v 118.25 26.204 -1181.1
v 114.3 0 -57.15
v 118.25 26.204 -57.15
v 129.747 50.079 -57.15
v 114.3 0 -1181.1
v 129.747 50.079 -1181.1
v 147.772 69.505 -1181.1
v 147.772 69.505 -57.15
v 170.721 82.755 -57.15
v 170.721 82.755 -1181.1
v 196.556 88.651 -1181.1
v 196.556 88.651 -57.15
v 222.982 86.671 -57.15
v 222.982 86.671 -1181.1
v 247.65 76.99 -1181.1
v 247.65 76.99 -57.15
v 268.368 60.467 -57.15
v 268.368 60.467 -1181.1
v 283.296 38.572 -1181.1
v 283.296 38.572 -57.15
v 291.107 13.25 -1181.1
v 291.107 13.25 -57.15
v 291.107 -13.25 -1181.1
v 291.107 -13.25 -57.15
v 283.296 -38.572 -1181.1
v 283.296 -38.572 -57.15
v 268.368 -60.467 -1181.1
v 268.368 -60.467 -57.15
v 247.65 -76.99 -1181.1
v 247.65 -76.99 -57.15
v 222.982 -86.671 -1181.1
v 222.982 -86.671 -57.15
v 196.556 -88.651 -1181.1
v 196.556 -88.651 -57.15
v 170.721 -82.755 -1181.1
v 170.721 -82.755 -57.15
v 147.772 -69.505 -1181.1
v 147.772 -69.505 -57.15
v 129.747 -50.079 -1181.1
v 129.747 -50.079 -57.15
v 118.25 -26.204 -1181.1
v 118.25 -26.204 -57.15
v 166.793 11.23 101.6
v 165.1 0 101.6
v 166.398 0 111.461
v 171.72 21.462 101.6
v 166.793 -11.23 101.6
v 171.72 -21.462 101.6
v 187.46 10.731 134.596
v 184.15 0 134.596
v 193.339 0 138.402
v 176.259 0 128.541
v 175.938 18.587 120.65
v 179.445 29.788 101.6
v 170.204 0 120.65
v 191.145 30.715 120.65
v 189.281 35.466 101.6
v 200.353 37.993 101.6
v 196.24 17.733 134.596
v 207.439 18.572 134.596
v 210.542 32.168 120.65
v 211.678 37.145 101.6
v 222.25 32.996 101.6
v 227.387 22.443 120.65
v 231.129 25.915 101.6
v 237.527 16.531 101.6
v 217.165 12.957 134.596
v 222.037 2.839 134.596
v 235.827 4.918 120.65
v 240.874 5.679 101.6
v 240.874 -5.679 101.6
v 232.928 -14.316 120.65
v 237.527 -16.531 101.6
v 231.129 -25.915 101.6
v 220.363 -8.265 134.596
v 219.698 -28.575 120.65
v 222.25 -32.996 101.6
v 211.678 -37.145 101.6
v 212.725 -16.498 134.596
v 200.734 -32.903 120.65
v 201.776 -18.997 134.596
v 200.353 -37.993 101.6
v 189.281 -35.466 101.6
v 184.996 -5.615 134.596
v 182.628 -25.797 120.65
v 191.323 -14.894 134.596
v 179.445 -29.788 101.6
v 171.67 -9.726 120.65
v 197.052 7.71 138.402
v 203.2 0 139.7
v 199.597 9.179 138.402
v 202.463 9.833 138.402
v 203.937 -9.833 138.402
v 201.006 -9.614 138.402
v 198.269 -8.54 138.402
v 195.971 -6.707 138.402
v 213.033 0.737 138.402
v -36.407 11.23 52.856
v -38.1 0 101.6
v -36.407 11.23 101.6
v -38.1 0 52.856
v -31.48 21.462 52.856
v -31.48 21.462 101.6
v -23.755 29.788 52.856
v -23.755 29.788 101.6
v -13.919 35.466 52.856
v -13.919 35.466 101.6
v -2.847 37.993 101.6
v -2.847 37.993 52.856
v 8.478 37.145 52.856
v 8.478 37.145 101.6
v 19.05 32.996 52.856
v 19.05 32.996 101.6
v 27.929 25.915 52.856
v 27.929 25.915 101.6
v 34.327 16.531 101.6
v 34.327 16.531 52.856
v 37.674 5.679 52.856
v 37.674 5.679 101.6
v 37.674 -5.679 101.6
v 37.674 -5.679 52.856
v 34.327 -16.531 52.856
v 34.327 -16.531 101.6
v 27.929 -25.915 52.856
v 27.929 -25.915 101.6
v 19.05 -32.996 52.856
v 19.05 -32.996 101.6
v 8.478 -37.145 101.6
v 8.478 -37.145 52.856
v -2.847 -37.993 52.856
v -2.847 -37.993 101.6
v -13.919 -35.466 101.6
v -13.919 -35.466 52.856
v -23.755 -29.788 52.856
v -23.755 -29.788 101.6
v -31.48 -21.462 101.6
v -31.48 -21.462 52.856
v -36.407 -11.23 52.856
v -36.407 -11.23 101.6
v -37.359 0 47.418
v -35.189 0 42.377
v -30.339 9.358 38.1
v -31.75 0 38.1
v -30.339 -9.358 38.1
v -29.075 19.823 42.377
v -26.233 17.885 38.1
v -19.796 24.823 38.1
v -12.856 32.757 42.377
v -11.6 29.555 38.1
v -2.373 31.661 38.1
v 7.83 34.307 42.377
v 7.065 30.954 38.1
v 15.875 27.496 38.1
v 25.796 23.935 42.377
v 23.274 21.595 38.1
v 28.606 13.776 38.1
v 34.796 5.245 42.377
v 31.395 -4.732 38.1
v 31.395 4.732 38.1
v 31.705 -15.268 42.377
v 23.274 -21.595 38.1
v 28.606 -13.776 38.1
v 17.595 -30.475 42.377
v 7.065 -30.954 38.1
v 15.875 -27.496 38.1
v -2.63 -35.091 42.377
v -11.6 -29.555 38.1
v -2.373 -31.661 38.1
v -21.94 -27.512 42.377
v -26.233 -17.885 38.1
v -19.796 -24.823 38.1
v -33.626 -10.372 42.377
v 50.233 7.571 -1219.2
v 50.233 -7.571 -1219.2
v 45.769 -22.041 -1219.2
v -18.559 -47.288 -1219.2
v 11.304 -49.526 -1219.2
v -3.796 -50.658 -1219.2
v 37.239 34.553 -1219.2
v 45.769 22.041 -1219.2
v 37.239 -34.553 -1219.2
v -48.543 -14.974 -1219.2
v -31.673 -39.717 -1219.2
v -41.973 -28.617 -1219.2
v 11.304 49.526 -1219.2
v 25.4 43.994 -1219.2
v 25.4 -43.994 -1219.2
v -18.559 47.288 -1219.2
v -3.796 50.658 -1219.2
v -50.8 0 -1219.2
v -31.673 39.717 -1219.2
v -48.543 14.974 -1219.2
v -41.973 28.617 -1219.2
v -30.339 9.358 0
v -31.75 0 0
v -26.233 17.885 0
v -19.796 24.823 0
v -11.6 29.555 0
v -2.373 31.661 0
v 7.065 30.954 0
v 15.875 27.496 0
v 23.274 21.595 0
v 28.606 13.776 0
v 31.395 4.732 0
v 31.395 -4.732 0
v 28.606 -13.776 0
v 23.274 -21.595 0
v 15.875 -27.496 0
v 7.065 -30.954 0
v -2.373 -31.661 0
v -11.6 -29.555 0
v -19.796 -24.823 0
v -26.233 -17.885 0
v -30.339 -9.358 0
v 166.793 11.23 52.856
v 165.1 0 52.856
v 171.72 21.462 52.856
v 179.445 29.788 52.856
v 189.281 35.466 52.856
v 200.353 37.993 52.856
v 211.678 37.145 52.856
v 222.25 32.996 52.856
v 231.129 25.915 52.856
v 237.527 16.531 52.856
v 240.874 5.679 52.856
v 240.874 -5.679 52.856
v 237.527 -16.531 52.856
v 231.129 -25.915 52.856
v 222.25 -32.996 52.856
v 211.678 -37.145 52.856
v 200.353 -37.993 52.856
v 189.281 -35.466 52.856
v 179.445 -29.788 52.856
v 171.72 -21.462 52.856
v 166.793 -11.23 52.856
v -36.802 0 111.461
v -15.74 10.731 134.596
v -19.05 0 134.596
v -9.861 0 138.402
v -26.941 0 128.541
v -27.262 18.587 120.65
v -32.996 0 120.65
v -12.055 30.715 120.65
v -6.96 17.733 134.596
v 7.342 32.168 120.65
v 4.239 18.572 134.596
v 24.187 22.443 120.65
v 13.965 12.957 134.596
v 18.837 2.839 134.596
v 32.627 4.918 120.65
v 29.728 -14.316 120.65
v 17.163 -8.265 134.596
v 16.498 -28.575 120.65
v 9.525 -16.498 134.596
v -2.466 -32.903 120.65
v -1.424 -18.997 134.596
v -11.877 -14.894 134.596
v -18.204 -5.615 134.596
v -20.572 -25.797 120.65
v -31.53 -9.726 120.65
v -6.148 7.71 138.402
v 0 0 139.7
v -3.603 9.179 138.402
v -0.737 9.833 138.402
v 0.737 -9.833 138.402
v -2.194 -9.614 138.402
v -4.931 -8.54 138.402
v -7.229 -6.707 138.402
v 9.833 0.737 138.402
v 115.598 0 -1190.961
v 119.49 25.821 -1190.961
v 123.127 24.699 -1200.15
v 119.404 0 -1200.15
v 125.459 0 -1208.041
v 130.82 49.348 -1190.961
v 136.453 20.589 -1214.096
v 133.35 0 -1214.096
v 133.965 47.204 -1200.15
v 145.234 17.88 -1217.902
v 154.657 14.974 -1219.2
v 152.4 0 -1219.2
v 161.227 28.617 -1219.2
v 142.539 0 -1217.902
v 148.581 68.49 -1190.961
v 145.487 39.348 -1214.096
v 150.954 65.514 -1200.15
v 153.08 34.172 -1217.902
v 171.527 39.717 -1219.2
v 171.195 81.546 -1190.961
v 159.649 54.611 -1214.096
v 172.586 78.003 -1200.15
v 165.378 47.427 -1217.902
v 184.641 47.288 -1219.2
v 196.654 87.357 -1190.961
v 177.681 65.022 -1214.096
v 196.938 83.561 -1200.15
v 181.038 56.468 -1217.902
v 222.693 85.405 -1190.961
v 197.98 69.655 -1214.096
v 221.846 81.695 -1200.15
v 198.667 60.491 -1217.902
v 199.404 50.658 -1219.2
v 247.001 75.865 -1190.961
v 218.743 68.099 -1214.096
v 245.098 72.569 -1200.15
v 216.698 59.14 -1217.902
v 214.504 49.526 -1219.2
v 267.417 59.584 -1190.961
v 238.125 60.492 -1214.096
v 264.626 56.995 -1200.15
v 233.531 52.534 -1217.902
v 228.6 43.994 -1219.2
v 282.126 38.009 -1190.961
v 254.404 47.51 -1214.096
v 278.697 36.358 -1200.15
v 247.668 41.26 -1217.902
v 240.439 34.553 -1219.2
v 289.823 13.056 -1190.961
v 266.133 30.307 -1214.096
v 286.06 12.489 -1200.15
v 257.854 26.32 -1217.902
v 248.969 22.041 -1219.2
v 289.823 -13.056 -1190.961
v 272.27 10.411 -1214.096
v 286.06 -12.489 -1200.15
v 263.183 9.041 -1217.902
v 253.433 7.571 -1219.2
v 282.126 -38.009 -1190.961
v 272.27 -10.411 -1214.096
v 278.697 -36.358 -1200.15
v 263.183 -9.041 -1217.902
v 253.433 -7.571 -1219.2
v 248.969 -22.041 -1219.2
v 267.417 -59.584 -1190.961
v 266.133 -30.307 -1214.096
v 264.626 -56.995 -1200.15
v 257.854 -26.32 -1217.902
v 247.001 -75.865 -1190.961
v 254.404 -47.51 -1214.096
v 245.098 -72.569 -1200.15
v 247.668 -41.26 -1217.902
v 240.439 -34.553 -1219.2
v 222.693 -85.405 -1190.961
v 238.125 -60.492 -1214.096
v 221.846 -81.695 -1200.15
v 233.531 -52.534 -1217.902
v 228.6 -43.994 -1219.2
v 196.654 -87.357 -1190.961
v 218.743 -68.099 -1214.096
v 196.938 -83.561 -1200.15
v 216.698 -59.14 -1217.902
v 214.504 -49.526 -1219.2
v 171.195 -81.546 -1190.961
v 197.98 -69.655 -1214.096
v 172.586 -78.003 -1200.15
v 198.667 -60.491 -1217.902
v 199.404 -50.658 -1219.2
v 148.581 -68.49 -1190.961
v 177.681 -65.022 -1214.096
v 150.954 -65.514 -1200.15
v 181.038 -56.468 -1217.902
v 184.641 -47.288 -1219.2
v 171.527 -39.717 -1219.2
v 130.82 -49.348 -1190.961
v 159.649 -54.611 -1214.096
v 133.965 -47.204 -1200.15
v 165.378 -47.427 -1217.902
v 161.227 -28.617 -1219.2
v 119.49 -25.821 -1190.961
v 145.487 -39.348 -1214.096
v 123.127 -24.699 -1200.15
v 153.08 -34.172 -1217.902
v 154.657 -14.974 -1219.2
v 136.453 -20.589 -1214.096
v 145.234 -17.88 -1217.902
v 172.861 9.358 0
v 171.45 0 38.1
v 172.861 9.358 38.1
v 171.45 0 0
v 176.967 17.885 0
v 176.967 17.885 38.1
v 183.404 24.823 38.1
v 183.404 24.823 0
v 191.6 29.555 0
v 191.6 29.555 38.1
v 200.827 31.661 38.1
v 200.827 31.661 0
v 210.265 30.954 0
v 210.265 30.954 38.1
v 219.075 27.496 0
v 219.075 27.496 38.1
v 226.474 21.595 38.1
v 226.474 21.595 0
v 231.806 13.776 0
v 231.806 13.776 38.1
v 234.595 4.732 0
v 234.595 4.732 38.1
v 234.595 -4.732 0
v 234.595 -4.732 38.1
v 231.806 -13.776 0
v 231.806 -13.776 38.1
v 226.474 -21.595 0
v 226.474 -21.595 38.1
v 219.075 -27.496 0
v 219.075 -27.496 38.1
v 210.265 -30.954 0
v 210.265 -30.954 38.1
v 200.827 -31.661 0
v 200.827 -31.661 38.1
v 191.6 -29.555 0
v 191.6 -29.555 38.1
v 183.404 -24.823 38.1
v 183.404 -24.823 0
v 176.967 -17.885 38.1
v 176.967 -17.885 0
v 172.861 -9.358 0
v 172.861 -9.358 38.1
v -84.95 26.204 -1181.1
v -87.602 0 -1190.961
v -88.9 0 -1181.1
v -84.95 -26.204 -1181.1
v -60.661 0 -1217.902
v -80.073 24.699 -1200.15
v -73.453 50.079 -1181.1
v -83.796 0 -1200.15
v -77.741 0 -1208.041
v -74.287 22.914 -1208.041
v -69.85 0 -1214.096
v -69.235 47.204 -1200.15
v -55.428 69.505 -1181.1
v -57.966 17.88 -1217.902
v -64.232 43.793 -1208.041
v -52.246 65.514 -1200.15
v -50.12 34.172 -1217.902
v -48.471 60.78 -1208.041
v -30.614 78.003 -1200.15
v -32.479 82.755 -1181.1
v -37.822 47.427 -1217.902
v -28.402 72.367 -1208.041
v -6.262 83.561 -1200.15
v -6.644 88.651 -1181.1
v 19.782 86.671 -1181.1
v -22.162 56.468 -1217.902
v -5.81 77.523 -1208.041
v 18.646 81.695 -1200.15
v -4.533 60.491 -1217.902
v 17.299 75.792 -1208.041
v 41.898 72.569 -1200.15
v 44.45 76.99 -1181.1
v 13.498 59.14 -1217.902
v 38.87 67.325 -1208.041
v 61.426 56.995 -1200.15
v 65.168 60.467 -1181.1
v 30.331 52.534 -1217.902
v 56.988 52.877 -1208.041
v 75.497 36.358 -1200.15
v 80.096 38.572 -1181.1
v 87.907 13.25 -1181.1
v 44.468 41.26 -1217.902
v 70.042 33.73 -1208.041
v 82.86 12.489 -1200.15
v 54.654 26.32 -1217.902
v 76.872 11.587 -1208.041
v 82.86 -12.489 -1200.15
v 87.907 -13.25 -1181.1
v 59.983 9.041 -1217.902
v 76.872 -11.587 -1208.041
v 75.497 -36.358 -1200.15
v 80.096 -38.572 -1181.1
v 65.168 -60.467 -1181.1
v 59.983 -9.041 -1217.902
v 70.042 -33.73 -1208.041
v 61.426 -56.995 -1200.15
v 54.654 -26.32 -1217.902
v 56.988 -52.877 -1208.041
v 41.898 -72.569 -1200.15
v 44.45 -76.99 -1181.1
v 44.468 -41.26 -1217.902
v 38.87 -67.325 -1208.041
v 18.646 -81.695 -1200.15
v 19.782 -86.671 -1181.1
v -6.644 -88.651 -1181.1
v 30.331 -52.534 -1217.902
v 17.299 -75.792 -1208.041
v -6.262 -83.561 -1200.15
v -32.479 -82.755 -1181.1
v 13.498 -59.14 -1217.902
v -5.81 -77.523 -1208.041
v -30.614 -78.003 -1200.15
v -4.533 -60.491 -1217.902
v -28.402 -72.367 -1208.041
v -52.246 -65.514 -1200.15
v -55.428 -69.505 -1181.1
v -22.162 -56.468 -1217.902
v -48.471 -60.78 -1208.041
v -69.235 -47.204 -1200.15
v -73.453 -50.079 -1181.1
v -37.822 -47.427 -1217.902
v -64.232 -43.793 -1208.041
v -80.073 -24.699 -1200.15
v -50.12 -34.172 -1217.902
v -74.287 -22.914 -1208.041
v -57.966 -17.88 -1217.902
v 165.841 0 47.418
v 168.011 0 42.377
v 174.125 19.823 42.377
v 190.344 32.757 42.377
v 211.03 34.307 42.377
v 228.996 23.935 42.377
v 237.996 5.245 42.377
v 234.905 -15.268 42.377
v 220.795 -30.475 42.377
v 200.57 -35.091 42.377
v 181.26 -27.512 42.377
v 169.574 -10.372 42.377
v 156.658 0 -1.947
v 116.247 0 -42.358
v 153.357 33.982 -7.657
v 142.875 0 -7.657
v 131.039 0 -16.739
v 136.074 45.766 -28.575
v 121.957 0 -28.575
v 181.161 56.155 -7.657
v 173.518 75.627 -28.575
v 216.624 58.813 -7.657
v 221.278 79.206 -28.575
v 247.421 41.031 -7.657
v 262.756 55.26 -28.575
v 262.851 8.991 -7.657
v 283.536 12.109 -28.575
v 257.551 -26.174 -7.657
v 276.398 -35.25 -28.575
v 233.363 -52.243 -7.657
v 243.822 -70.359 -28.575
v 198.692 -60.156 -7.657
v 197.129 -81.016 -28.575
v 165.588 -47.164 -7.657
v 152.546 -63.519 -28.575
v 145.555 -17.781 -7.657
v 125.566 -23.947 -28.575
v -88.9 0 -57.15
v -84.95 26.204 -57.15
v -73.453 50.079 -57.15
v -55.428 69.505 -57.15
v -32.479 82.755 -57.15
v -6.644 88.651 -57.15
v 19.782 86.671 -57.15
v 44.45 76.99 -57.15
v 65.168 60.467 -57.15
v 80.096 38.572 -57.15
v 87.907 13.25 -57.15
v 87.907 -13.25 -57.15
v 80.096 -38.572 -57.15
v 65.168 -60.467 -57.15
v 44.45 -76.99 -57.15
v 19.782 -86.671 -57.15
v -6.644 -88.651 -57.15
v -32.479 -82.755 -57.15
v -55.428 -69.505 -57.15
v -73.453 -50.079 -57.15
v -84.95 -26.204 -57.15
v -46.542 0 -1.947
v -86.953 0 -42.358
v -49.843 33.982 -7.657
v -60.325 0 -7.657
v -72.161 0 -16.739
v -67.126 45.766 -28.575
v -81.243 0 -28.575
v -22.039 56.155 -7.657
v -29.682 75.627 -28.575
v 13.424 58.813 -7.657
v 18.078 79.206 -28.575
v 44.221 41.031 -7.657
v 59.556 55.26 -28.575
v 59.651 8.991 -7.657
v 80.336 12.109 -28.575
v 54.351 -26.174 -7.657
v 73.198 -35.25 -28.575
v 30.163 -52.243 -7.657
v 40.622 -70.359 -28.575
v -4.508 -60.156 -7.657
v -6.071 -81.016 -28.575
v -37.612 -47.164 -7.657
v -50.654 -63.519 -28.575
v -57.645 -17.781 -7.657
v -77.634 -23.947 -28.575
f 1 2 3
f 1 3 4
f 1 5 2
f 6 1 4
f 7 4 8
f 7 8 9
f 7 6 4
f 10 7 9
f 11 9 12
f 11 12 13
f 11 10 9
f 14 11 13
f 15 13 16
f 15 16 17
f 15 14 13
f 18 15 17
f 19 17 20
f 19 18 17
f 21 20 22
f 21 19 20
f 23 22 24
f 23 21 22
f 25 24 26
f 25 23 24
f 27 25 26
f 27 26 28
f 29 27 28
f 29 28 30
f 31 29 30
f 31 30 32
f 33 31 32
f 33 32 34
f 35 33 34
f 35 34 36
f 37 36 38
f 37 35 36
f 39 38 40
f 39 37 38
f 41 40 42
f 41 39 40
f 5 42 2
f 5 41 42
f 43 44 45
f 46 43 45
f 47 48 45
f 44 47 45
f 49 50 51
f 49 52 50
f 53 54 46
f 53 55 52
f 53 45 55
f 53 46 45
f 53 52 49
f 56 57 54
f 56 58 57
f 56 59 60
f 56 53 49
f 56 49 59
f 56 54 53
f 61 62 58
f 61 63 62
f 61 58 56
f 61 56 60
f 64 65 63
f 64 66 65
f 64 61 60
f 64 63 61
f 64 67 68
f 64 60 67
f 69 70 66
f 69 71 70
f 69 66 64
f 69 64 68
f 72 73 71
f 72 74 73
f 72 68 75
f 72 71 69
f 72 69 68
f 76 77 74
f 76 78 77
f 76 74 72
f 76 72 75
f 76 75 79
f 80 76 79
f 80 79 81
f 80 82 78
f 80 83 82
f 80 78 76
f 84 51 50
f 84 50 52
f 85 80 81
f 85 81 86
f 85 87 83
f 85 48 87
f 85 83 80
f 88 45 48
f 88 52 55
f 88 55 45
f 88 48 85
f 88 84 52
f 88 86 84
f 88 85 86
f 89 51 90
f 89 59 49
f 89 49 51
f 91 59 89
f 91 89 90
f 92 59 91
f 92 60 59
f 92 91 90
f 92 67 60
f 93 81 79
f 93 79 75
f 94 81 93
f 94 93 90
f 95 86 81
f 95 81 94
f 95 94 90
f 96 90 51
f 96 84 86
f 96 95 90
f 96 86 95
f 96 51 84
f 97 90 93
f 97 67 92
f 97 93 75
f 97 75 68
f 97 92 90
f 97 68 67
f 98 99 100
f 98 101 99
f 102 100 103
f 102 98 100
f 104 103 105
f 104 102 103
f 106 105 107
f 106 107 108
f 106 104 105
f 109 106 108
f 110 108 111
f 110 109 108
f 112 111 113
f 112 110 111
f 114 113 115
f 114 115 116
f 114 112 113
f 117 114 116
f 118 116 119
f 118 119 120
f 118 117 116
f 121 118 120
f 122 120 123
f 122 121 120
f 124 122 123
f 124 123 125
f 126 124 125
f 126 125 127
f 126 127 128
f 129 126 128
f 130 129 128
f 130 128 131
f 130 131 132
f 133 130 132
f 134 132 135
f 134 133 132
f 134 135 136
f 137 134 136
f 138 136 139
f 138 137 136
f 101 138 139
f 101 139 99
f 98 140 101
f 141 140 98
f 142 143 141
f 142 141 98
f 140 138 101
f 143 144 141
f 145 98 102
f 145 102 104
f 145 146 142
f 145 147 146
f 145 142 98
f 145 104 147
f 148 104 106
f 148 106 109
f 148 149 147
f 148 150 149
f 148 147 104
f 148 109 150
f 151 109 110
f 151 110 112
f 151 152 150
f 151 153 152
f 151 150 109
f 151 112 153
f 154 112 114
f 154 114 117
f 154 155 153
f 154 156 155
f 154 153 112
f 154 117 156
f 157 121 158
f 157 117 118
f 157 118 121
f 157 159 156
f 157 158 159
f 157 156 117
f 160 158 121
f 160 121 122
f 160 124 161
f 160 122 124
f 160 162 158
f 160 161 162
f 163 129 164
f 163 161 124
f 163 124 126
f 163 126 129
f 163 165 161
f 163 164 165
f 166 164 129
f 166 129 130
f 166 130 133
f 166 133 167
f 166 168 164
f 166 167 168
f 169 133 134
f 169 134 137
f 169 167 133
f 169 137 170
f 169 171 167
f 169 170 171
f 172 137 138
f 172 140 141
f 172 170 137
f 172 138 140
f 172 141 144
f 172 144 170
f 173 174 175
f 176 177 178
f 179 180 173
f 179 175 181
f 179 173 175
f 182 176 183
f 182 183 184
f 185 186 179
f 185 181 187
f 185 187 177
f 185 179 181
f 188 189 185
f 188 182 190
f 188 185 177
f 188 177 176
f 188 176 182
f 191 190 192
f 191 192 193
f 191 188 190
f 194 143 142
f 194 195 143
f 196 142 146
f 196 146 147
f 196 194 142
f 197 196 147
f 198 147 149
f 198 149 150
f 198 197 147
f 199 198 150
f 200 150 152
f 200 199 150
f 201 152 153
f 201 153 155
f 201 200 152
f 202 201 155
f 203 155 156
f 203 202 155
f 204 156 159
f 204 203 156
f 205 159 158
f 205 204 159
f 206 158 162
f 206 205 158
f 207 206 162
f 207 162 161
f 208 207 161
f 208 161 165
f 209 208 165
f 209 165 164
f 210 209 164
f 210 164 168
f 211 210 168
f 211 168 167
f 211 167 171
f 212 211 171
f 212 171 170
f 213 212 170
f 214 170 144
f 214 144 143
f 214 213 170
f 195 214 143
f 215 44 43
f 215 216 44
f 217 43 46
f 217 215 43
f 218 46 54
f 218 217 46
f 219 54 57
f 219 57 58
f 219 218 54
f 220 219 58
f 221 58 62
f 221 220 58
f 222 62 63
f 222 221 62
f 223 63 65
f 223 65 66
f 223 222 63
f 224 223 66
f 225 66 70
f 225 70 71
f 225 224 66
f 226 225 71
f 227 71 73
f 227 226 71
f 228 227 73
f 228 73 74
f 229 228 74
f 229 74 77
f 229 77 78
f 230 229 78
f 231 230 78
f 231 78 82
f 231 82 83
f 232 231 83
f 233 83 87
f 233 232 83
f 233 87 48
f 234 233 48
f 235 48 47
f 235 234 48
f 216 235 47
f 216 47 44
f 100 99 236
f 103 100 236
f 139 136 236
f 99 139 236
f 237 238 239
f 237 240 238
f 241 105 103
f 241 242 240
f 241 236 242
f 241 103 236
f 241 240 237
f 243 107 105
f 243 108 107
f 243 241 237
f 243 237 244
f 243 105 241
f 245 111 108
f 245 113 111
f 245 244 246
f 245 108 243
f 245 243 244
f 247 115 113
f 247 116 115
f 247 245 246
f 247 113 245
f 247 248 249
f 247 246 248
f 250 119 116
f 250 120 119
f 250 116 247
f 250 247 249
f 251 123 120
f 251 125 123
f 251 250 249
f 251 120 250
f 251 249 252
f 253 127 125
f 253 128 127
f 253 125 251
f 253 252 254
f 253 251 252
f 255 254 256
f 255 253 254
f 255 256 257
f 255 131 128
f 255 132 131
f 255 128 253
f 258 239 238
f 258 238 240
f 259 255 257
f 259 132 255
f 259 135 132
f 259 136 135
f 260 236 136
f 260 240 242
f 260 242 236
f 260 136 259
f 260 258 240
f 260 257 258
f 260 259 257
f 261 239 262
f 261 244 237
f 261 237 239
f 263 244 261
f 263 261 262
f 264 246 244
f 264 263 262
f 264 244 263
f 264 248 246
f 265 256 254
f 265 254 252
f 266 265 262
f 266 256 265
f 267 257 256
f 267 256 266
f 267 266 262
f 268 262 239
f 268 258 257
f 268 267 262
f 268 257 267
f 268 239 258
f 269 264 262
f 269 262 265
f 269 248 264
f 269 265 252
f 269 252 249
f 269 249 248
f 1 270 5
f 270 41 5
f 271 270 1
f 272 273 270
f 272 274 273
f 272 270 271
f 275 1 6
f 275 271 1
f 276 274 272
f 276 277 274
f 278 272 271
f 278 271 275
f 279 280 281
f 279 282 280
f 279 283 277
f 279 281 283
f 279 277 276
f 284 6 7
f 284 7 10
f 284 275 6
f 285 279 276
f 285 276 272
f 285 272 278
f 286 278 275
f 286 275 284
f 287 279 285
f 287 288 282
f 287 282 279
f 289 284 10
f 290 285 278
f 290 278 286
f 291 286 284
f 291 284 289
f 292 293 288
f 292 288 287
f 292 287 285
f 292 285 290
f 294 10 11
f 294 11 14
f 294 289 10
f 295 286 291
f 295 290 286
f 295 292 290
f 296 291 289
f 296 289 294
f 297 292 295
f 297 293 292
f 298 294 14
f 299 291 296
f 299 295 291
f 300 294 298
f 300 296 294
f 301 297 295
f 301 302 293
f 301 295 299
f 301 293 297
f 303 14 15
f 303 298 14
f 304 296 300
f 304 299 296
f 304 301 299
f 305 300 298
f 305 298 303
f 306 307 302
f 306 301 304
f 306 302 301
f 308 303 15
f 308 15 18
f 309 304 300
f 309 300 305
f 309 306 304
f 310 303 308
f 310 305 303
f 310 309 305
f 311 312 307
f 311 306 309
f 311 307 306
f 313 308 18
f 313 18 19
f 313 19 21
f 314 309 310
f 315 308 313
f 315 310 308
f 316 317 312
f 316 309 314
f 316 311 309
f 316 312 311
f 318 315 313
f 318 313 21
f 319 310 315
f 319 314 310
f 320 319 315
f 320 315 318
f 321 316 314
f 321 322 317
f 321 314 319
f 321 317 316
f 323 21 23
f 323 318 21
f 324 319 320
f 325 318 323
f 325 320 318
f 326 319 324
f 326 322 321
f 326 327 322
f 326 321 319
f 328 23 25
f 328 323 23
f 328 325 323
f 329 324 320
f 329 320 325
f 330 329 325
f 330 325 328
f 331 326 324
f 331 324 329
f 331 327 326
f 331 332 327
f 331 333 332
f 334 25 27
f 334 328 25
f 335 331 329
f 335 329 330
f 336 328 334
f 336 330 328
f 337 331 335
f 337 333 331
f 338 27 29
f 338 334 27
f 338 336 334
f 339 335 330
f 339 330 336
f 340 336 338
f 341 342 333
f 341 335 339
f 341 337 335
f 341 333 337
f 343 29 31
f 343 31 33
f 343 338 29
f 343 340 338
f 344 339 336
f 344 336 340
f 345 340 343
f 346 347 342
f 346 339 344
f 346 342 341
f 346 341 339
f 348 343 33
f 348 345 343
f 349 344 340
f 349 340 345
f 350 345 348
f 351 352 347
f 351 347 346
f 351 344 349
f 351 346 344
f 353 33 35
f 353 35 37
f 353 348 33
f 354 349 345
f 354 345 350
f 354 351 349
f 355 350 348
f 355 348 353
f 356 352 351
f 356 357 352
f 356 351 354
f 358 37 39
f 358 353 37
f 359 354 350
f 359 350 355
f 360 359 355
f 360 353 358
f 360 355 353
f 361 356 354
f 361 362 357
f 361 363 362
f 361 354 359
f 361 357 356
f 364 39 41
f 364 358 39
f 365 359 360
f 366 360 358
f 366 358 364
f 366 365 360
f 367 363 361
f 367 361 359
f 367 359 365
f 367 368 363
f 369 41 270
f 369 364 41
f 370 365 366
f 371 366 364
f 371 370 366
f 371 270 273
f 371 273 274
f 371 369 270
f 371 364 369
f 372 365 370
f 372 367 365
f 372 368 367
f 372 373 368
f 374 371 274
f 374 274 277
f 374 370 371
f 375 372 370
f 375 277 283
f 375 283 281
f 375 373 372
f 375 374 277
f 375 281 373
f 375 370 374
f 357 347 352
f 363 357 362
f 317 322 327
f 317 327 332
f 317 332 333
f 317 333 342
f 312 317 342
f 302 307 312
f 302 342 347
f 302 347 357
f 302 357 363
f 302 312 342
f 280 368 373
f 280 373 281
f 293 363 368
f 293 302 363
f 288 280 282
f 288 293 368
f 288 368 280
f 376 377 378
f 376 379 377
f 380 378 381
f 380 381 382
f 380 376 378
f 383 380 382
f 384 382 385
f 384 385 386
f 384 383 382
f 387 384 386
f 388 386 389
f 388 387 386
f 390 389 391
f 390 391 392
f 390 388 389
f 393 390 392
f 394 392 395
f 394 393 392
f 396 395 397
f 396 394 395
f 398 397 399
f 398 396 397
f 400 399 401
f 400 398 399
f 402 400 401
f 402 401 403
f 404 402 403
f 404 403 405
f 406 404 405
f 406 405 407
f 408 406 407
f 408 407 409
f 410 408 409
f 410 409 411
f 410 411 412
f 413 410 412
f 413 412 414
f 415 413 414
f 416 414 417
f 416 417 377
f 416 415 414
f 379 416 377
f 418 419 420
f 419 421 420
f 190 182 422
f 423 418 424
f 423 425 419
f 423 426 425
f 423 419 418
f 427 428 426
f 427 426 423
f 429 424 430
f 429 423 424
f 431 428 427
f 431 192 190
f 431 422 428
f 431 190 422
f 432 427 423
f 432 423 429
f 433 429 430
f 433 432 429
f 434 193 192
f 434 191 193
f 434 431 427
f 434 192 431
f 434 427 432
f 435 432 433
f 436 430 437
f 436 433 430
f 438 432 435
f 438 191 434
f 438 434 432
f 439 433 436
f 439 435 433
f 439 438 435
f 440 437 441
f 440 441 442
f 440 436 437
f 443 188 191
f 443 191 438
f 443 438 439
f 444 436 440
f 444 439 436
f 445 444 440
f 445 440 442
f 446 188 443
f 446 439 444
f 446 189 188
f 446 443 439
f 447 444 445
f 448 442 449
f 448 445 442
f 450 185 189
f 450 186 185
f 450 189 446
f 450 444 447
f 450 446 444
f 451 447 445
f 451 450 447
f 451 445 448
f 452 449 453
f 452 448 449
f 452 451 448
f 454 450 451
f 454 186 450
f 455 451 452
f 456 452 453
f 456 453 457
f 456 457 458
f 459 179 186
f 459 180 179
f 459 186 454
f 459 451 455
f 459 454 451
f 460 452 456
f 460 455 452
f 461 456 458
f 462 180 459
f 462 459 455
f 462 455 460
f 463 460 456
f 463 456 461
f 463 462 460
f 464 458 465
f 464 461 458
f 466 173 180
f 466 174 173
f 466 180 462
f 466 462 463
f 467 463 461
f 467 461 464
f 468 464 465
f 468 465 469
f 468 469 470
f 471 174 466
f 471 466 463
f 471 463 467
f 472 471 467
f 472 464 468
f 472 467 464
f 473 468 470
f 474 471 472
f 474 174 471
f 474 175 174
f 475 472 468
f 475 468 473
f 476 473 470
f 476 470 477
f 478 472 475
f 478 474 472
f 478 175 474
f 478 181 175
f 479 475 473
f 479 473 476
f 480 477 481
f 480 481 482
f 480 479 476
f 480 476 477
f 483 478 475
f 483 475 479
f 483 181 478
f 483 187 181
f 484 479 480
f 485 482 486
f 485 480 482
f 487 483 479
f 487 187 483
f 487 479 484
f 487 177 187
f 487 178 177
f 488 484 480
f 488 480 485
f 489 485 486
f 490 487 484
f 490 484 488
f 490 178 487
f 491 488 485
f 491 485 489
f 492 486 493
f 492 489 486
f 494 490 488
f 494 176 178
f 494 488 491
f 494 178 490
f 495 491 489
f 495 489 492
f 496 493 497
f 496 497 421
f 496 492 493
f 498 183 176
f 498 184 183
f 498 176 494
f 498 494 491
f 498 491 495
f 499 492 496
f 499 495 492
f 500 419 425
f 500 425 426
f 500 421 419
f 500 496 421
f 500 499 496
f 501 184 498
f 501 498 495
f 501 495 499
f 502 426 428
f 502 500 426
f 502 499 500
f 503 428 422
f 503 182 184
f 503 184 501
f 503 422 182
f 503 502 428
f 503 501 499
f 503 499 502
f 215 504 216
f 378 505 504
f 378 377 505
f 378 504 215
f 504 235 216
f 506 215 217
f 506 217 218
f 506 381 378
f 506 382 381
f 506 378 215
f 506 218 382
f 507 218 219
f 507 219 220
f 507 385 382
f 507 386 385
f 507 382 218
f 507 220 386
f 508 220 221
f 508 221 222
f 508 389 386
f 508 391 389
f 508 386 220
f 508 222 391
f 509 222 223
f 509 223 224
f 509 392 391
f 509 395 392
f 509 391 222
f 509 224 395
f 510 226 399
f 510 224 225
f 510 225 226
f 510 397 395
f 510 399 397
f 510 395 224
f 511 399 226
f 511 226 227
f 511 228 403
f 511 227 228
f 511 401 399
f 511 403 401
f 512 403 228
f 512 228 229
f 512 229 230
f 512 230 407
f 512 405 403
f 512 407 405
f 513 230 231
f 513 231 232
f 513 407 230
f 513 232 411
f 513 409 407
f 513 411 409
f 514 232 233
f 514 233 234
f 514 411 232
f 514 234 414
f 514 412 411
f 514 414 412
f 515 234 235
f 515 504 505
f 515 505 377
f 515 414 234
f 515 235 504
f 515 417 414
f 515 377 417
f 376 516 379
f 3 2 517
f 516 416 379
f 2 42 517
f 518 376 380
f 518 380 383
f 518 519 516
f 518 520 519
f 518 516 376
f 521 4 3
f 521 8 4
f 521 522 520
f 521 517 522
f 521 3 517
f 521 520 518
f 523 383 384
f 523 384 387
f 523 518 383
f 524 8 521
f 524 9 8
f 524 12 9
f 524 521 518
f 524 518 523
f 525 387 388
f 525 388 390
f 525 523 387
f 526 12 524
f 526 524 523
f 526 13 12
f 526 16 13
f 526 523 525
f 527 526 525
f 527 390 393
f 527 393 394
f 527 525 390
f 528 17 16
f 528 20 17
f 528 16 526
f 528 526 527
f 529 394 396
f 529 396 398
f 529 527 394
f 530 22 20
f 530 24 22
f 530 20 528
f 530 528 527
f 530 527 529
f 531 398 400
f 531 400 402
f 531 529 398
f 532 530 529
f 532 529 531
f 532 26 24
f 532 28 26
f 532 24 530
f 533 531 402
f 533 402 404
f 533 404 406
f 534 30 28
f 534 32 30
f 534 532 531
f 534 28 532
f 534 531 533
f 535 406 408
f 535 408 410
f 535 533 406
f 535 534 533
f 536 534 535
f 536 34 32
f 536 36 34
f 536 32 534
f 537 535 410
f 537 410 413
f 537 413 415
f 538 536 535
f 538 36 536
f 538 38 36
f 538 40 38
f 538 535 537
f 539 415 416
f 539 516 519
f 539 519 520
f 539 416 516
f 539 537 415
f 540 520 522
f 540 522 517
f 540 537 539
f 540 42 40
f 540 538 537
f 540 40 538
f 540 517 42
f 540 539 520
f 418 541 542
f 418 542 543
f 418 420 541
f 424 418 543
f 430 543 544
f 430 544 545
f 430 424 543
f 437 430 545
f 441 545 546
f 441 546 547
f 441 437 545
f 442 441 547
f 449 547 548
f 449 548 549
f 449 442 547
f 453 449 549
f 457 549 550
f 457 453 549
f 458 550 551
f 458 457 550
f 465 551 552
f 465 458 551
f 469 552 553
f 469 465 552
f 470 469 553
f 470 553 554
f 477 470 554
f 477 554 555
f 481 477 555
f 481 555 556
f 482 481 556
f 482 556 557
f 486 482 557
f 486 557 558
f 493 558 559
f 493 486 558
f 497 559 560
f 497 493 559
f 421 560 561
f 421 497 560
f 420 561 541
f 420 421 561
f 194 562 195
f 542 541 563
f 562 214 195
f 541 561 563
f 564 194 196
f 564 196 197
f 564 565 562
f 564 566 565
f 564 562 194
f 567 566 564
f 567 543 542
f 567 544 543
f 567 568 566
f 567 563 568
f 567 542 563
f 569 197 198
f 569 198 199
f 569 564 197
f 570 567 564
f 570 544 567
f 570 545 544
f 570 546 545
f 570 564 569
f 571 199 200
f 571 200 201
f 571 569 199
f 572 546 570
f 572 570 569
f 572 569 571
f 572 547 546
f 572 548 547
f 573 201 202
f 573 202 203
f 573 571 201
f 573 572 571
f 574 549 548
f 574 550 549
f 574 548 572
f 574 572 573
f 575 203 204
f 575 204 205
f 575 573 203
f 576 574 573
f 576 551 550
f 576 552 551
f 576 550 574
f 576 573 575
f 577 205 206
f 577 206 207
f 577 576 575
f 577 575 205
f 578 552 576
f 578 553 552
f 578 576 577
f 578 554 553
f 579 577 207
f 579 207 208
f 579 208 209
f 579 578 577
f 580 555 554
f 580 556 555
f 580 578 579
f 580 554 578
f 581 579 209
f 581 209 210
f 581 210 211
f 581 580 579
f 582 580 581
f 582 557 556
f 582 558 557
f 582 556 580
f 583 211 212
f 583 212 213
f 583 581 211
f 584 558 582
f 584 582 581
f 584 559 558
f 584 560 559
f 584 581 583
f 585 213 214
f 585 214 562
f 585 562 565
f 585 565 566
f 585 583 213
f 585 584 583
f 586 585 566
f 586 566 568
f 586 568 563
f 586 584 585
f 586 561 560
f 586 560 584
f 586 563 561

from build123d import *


with BuildPart() as f1:
    # F0 (on Front) → F1 (revolve)
    with BuildSketch(Plane.XZ):
        with BuildLine():
            Line((-50.8, -1219.2), (0, -1219.2))
            Line((0, -1219.2), (0, 139.7))
            ThreePointArc((0, 139.7), (-26.940768, 128.540768), (-38.1, 101.6))
            Line((-38.1, 101.6), (-38.1, 52.856067))
            ThreePointArc((-38.1, 52.856067), (-36.445112, 44.823881), (-31.75, 38.1))
            Line((-31.75, 38.1), (-31.75, 0))
            ThreePointArc((-31.75, 0), (-72.161153, -16.738847), (-88.9, -57.15))
            Line((-88.9, -57.15), (-88.9, -1181.1))
            ThreePointArc((-88.9, -1181.1), (-77.740768, -1208.040768), (-50.8, -1219.2))
        make_face()
    revolve(axis=Axis((0, 0, -596.186563), (0, 0, -1)))


with BuildPart() as f3:
    # F2 (on Front) → F3 (revolve)
    with BuildSketch(Plane.XZ):
        with BuildLine():
            Line((152.4, -1219.2), (203.2, -1219.2))
            Line((203.2, -1219.2), (203.2, 139.7))
            ThreePointArc((203.2, 139.7), (176.259232, 128.540768), (165.1, 101.6))
            Line((165.1, 101.6), (165.1, 52.856067))
            ThreePointArc((165.1, 52.856067), (166.754888, 44.823881), (171.45, 38.1))
            Line((171.45, 38.1), (171.45, 0))
            ThreePointArc((171.45, 0), (131.038847, -16.738847), (114.3, -57.15))
            Line((114.3, -57.15), (114.3, -1181.1))
            ThreePointArc((114.3, -1181.1), (125.459232, -1208.040768), (152.4, -1219.2))
        make_face()
    revolve(axis=Axis((203.2, 0, -596.186563), (0, 0, -1)))


solid = Compound([f1.part, f3.part])
